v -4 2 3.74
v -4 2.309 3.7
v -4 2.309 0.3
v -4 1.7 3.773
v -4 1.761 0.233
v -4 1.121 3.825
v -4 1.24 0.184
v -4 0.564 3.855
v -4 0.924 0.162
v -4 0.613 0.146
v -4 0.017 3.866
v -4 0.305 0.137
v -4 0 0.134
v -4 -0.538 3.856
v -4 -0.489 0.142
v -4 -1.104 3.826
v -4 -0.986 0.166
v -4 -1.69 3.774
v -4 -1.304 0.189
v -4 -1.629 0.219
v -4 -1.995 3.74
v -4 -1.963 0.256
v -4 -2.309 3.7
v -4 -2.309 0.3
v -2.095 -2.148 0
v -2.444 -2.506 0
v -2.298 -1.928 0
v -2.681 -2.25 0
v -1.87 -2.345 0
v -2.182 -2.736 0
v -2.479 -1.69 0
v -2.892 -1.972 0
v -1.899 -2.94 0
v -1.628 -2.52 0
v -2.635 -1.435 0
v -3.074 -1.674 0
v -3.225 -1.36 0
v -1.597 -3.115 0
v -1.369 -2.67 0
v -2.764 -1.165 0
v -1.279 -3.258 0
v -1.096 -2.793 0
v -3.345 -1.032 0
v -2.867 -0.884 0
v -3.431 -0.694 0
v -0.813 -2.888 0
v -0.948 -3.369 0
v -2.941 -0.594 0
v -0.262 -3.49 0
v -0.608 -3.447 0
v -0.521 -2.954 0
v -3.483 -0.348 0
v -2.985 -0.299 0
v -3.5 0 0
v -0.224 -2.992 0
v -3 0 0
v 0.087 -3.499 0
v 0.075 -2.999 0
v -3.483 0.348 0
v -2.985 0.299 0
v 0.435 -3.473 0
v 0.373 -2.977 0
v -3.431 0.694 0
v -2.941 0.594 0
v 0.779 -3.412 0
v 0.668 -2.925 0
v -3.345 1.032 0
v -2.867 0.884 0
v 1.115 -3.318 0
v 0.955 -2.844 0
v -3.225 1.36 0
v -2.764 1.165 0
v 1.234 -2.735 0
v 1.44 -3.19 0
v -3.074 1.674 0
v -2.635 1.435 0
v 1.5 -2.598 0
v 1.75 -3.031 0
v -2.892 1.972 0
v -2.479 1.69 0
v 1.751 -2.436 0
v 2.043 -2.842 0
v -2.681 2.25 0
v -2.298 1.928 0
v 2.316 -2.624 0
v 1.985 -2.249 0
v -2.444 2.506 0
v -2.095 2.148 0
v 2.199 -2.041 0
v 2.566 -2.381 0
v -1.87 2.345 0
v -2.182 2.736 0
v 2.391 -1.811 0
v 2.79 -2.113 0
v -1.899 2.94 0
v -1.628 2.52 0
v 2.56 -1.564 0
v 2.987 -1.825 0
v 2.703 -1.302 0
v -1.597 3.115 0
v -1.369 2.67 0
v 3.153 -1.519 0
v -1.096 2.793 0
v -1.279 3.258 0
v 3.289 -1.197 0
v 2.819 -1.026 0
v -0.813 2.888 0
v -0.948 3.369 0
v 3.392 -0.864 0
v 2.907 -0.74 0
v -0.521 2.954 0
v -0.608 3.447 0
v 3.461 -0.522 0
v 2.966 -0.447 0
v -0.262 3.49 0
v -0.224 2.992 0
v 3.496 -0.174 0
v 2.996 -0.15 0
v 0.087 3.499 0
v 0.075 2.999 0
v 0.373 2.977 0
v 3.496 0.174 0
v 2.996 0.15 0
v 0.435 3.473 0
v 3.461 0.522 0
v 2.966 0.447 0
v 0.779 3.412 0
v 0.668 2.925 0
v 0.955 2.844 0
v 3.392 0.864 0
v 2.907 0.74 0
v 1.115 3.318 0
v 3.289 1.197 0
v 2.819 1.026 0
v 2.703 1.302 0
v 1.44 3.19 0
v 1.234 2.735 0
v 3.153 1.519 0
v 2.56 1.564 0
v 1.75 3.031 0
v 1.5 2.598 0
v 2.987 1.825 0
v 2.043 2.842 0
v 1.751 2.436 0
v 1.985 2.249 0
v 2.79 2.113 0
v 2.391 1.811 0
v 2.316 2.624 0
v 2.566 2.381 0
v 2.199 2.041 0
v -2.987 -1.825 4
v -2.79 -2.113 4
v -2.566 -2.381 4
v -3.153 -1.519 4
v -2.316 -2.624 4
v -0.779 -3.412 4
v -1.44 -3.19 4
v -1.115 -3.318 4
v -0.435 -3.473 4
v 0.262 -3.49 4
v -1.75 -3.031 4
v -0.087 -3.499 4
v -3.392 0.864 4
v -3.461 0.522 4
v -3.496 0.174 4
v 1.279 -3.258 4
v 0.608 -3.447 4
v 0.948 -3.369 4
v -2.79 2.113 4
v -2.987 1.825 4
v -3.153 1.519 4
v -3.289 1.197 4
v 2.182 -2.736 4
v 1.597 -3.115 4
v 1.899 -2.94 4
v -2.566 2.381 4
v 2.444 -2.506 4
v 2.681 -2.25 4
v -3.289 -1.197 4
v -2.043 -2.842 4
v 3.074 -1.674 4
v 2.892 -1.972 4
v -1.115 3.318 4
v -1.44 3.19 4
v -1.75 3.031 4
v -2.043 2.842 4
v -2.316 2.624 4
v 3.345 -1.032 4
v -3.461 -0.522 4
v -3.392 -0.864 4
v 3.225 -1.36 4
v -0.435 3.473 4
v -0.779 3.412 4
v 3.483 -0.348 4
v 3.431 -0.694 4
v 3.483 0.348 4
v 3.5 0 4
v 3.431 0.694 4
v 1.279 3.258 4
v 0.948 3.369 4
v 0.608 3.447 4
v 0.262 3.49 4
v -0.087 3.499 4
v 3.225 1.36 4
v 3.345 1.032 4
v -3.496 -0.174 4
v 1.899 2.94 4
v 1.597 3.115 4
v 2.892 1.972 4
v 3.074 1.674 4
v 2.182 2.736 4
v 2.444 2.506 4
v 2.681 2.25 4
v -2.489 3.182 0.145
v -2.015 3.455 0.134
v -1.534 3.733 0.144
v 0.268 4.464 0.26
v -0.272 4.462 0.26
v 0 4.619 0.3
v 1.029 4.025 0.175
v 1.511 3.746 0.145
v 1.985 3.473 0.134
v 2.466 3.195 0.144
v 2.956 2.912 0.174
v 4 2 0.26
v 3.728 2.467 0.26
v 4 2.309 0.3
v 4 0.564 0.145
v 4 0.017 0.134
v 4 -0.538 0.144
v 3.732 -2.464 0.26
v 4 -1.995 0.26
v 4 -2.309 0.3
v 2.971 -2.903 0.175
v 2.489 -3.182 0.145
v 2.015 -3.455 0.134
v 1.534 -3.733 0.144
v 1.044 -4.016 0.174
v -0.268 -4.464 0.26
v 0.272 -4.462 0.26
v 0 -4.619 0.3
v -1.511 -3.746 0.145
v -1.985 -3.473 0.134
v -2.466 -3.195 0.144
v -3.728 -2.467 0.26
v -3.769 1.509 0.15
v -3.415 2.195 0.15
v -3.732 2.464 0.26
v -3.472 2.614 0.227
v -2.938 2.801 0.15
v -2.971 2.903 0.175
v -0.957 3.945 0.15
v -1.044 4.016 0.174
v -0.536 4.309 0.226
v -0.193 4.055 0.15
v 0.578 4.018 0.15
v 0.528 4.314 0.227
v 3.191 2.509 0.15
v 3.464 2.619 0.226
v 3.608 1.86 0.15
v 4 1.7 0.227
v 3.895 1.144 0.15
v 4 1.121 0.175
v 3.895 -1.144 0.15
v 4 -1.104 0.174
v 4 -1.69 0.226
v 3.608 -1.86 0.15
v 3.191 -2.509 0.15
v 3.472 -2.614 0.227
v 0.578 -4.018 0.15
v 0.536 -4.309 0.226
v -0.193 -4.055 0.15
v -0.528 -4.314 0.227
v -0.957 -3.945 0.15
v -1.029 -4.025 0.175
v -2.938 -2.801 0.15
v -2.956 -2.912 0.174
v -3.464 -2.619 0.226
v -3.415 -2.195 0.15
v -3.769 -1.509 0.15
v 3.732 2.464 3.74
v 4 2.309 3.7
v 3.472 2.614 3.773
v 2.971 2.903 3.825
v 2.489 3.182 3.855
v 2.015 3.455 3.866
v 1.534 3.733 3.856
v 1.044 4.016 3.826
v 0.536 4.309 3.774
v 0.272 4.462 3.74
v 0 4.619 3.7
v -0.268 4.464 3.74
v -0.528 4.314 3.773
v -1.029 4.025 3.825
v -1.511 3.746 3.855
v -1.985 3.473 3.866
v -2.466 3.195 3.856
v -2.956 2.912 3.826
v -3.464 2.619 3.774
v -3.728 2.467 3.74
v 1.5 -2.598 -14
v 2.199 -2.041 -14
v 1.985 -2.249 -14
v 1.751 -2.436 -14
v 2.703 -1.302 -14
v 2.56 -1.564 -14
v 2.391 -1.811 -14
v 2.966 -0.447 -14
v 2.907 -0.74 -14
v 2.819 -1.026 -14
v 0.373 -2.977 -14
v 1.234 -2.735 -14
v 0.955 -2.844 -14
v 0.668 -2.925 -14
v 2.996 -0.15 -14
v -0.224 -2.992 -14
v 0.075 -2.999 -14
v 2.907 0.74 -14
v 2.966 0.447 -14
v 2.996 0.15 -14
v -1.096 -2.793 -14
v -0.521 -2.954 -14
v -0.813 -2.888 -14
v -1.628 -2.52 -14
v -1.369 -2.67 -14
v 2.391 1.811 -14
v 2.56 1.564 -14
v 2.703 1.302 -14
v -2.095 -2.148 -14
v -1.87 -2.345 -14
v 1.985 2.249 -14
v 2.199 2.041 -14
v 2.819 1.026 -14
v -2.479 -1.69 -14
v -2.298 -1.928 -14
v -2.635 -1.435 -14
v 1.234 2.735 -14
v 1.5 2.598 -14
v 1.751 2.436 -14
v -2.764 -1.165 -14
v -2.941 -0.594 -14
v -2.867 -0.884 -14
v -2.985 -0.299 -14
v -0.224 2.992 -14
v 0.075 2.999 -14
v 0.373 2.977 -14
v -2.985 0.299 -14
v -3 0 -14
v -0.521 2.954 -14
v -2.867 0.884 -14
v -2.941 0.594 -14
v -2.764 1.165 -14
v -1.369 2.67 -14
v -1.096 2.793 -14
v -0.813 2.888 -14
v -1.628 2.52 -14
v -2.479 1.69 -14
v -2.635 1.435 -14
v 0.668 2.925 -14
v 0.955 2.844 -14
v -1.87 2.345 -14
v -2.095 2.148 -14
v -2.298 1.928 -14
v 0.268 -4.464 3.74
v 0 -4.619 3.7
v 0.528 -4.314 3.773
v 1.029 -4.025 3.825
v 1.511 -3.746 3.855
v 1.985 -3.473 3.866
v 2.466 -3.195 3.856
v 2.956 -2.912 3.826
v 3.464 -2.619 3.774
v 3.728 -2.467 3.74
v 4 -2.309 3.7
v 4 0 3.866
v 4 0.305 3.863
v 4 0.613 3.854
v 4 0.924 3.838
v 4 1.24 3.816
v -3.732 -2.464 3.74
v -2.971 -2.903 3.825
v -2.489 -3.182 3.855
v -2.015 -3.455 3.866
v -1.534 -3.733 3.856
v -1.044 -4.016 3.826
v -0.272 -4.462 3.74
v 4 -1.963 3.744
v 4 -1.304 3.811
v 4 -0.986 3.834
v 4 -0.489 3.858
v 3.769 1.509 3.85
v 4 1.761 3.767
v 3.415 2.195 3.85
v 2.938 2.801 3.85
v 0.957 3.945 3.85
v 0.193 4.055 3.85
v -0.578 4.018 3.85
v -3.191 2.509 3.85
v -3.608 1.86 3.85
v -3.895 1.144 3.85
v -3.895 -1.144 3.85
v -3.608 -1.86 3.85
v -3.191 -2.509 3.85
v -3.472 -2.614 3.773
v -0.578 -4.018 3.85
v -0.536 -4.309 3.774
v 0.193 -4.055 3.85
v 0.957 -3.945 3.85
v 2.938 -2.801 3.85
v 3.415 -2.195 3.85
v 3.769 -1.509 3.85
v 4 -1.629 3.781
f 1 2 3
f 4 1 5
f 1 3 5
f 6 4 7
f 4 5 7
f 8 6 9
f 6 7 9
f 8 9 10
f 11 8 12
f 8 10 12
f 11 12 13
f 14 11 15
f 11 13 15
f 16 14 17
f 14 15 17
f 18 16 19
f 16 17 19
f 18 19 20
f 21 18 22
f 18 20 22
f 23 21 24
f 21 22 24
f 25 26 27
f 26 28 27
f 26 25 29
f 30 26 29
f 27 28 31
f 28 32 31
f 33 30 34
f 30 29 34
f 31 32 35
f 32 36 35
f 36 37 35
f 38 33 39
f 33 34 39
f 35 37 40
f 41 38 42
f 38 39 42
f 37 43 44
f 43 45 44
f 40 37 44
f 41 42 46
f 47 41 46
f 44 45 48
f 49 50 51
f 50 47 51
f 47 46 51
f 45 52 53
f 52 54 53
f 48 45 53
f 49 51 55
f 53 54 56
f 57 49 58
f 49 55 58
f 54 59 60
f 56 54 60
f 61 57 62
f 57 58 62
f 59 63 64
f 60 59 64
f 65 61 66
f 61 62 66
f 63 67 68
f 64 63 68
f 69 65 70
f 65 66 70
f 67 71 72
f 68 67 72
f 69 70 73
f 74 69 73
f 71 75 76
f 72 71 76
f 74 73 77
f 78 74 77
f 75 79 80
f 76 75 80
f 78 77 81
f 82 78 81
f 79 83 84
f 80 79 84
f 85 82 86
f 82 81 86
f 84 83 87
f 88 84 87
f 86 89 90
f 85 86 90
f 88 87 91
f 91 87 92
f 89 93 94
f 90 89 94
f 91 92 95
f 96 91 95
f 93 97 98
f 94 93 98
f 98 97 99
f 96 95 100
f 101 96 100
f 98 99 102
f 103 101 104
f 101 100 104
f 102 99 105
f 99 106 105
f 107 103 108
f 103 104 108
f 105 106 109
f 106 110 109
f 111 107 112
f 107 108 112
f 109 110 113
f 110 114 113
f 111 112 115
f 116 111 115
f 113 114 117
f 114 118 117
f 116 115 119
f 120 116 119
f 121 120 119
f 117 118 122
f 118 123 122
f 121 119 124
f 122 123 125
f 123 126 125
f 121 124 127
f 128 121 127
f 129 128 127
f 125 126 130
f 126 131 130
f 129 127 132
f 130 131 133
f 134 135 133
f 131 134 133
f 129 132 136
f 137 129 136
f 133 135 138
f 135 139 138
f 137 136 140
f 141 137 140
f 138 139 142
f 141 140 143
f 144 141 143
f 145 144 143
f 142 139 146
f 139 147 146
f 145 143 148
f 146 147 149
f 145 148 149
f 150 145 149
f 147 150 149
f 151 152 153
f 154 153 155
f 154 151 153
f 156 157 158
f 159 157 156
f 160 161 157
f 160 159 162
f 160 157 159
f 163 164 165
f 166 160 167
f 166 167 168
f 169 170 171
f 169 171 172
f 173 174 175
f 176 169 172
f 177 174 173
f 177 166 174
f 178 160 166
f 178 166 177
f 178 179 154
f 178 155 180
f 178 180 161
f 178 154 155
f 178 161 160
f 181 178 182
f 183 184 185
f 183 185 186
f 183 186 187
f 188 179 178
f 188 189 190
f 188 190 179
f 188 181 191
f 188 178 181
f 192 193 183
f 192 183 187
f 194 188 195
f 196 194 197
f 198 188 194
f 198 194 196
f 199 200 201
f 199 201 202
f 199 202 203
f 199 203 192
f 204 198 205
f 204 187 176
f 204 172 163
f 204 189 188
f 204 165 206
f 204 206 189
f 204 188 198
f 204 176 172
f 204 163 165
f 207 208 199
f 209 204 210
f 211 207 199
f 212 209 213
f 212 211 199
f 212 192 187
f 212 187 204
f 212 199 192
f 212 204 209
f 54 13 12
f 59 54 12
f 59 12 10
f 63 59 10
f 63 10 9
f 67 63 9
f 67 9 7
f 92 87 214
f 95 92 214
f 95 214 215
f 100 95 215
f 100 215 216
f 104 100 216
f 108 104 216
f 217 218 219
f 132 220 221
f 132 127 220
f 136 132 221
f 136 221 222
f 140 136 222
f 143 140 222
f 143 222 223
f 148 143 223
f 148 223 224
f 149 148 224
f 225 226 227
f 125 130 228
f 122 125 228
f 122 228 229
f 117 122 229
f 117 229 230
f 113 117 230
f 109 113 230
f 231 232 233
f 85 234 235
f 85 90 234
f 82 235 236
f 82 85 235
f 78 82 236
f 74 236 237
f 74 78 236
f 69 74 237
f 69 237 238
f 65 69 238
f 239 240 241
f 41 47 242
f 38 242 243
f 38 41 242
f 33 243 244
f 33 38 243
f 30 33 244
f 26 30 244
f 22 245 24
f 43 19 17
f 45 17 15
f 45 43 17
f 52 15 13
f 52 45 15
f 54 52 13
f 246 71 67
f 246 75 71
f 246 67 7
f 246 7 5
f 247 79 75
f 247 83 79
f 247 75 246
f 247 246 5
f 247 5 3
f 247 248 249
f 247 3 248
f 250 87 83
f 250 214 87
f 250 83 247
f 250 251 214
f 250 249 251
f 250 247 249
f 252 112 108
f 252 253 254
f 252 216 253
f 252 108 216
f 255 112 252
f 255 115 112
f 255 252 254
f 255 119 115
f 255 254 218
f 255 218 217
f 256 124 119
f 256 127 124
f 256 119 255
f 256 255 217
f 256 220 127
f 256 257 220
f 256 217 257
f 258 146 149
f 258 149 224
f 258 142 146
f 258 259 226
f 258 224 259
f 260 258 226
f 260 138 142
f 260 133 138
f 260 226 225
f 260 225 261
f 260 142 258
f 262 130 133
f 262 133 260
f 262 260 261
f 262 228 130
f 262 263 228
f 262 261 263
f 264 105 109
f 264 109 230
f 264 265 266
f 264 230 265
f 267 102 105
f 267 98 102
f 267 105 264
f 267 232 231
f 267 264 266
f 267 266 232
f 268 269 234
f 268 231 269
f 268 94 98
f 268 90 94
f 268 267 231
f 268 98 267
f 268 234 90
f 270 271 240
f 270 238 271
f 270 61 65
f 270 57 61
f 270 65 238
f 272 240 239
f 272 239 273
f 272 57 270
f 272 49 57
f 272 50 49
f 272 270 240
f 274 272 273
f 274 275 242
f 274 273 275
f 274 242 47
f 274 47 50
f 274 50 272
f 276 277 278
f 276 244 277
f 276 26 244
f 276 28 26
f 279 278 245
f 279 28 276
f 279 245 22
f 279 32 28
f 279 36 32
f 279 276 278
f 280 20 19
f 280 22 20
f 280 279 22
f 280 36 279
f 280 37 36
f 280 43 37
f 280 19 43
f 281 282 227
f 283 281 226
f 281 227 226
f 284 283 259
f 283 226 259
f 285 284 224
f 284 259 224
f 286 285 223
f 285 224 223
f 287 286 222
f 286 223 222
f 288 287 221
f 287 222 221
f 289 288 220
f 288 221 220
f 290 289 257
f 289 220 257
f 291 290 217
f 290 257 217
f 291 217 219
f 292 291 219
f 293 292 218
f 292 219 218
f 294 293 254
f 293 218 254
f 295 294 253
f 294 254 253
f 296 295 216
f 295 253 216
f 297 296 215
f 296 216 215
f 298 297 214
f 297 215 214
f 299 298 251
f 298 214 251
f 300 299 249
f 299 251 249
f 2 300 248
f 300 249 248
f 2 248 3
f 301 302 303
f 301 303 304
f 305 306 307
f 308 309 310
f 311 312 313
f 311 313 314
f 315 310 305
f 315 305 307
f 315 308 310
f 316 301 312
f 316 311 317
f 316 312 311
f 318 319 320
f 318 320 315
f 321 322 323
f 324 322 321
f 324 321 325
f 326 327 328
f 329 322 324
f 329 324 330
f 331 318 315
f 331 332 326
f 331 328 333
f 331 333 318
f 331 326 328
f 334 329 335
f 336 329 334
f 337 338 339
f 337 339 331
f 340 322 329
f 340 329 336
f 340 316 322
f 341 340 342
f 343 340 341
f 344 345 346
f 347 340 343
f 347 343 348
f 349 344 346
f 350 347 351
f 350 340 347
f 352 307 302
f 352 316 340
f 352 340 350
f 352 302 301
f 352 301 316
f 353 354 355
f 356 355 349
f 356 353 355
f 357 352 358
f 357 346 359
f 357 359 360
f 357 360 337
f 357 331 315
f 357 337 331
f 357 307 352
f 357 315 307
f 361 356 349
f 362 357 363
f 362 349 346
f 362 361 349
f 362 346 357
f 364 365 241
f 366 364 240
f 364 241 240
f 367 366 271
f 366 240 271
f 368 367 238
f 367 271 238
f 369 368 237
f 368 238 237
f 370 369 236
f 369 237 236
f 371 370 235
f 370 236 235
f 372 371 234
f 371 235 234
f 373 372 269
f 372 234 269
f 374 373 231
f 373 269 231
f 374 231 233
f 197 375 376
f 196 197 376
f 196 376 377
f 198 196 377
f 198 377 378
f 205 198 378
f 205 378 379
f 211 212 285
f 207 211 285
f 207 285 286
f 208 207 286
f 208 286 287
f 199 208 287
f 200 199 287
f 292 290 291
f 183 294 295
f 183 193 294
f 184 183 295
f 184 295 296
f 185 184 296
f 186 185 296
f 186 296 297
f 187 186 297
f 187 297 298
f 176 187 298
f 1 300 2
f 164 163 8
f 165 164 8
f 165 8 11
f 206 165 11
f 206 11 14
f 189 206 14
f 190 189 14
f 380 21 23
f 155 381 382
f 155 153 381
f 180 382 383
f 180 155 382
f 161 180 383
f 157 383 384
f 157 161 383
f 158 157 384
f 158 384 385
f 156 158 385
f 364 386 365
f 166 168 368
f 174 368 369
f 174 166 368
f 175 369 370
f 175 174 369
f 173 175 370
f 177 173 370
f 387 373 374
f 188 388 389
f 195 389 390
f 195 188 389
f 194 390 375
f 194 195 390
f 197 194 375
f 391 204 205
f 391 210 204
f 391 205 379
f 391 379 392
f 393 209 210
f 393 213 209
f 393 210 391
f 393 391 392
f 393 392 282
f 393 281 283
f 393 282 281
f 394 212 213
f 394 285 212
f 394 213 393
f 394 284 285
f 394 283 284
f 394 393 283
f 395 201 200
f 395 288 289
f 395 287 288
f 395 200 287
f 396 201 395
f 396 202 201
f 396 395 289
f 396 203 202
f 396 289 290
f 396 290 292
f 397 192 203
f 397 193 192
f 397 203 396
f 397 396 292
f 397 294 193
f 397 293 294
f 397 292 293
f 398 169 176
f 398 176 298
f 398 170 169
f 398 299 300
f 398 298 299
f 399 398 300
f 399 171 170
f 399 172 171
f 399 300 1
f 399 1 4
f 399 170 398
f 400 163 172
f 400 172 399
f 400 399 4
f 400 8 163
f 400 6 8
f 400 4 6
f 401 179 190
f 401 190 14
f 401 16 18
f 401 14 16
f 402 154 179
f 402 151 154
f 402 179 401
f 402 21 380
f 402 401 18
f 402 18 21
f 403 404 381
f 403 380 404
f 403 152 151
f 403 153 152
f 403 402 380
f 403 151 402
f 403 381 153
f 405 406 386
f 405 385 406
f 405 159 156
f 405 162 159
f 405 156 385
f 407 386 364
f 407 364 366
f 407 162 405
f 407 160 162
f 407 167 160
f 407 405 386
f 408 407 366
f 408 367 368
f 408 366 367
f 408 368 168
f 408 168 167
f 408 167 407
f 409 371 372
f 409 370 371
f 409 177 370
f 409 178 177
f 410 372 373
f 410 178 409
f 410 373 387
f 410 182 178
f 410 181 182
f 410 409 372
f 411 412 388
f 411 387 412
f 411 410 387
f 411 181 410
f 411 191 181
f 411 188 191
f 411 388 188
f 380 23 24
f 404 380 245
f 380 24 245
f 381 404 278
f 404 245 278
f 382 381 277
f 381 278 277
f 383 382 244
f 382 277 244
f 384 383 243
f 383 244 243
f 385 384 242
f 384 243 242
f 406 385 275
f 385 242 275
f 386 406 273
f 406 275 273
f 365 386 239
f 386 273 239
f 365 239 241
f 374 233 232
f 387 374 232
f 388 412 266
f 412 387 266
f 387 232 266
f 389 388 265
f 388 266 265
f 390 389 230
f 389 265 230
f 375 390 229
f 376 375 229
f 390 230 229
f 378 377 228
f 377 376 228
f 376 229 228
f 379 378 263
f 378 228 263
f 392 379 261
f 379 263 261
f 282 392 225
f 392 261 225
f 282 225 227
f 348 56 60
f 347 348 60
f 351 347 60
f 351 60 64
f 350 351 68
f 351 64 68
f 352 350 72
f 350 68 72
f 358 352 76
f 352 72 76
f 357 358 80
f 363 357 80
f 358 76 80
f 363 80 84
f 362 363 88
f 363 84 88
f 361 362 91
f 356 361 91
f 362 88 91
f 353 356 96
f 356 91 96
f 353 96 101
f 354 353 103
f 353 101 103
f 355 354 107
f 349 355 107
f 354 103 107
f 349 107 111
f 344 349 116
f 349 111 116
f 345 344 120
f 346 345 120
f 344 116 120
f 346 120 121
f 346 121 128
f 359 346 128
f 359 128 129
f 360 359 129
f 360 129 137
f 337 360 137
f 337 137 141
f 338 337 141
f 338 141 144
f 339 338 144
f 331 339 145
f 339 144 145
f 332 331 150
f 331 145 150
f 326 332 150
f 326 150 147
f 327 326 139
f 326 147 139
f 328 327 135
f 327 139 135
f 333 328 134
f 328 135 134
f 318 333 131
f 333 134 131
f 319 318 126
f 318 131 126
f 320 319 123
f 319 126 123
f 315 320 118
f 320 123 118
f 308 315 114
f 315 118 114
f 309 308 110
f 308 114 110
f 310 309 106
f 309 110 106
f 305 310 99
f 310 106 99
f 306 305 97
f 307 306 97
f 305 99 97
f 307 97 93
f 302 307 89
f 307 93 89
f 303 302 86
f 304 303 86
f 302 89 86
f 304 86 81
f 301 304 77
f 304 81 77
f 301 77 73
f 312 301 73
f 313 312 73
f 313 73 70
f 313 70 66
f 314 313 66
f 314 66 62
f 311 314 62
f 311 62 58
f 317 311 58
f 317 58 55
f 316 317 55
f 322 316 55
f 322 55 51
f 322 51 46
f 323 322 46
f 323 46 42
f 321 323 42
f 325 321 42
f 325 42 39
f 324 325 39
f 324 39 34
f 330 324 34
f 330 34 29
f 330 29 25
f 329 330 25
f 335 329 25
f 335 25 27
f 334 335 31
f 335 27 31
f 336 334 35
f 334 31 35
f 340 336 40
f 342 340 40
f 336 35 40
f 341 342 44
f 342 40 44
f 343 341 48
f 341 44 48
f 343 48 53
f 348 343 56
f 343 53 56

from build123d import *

# Parameters (mm, degrees)
RESSALTO_EXTRUS_O1_DEPTH = 4
ESBO_O2_OUTSIDE_W        = 124.534
ESBO_O2_OUTSIDE_H        = 125.772
ESBO_O2_OUTSIDE_R        = 3.5
CORTE_EXTRUS_O1_DEPTH    = 15
CORTE_EXTRUS_O1_DRAFT    = -75
ESBO_O3_OUTSIDE_W        = 124.534
ESBO_O3_OUTSIDE_H        = 125.772
ESBO_O3_OUTSIDE_R        = 3.5
CORTE_EXTRUS_O5_DEPTH    = 15
CORTE_EXTRUS_O5_DRAFT    = -75
ESBO_O9_R                = 3
RESSALTO_EXTRUS_O2_DEPTH = 14


with BuildPart() as part:
    # Esboço1 → Ressalto-extrusão1 (new body)
    with BuildSketch(Plane.XY):
        Polygon((0, -4.618802154), (4, -2.309401077), (4, 2.309401077), (0, 4.618802154), (-4, 2.309401077), (-4, -2.309401077), align=None)
    extrude(amount=RESSALTO_EXTRUS_O1_DEPTH)


with BuildPart() as corte_extrus_o1_tool:
    # Esboço2 outside → Corte-extrusão1 (with draft: the straight prism first)
    with BuildSketch(Plane.XY.offset(4)):
        Rectangle(ESBO_O2_OUTSIDE_W, ESBO_O2_OUTSIDE_H)
        Circle(ESBO_O2_OUTSIDE_R, mode=Mode.SUBTRACT)
    extrude(amount=-CORTE_EXTRUS_O1_DEPTH)
    # Corte-extrusão1: the draft: its side faces are tilted about the plane it starts from
    corte_extrus_o1_sides = [corte_extrus_o1_tool.faces().sort_by_distance(p)[0] for p in [
        (0, -62.886, -3.5),
        (62.267, 0, -3.5),
        (0, 62.886, -3.5),
        (-62.267, 0, -3.5),
        (-3.5, 0, -3.5),
    ]]
    draft(corte_extrus_o1_sides, Plane.XY.offset(4), CORTE_EXTRUS_O1_DRAFT)


with BuildPart() as part_1:
    add(part.part)

    # Corte-extrusão1: cut by corte_extrus_o1_tool
    add(corte_extrus_o1_tool.part, mode=Mode.SUBTRACT)


with BuildPart() as corte_extrus_o5_tool:
    # Esboço3 outside → Corte-extrusão5 (with draft: the straight prism first)
    with BuildSketch(Plane(origin=(0, 0, 0), x_dir=(-1, 0, 0), z_dir=(0, 0, -1))):
        Rectangle(ESBO_O3_OUTSIDE_W, ESBO_O3_OUTSIDE_H)
        Circle(ESBO_O3_OUTSIDE_R, mode=Mode.SUBTRACT)
    extrude(amount=-CORTE_EXTRUS_O5_DEPTH)
    # Corte-extrusão5: the draft: its side faces are tilted about the plane it starts from
    corte_extrus_o5_sides = [corte_extrus_o5_tool.faces().sort_by_distance(p)[0] for p in [
        (0, -62.886, 7.5),
        (-62.267, 0, 7.5),
        (0, 62.886, 7.5),
        (62.267, 0, 7.5),
        (3.5, 0, 7.5),
    ]]
    draft(corte_extrus_o5_sides, Plane(origin=(0, 0, 0), x_dir=(-1, 0, 0), z_dir=(0, 0, -1)), CORTE_EXTRUS_O5_DRAFT)


with BuildPart() as part_2:
    add(part_1.part)

    # Corte-extrusão5: cut by corte_extrus_o5_tool
    add(corte_extrus_o5_tool.part, mode=Mode.SUBTRACT)

    # Esboço9 → Ressalto-extrusão2 (add)
    with BuildSketch(Plane(origin=(0, 0, 0), x_dir=(-1, 0, 0), z_dir=(0, 0, -1))):
        Circle(ESBO_O9_R)
    extrude(amount=RESSALTO_EXTRUS_O2_DEPTH)


solid = part_2.part
